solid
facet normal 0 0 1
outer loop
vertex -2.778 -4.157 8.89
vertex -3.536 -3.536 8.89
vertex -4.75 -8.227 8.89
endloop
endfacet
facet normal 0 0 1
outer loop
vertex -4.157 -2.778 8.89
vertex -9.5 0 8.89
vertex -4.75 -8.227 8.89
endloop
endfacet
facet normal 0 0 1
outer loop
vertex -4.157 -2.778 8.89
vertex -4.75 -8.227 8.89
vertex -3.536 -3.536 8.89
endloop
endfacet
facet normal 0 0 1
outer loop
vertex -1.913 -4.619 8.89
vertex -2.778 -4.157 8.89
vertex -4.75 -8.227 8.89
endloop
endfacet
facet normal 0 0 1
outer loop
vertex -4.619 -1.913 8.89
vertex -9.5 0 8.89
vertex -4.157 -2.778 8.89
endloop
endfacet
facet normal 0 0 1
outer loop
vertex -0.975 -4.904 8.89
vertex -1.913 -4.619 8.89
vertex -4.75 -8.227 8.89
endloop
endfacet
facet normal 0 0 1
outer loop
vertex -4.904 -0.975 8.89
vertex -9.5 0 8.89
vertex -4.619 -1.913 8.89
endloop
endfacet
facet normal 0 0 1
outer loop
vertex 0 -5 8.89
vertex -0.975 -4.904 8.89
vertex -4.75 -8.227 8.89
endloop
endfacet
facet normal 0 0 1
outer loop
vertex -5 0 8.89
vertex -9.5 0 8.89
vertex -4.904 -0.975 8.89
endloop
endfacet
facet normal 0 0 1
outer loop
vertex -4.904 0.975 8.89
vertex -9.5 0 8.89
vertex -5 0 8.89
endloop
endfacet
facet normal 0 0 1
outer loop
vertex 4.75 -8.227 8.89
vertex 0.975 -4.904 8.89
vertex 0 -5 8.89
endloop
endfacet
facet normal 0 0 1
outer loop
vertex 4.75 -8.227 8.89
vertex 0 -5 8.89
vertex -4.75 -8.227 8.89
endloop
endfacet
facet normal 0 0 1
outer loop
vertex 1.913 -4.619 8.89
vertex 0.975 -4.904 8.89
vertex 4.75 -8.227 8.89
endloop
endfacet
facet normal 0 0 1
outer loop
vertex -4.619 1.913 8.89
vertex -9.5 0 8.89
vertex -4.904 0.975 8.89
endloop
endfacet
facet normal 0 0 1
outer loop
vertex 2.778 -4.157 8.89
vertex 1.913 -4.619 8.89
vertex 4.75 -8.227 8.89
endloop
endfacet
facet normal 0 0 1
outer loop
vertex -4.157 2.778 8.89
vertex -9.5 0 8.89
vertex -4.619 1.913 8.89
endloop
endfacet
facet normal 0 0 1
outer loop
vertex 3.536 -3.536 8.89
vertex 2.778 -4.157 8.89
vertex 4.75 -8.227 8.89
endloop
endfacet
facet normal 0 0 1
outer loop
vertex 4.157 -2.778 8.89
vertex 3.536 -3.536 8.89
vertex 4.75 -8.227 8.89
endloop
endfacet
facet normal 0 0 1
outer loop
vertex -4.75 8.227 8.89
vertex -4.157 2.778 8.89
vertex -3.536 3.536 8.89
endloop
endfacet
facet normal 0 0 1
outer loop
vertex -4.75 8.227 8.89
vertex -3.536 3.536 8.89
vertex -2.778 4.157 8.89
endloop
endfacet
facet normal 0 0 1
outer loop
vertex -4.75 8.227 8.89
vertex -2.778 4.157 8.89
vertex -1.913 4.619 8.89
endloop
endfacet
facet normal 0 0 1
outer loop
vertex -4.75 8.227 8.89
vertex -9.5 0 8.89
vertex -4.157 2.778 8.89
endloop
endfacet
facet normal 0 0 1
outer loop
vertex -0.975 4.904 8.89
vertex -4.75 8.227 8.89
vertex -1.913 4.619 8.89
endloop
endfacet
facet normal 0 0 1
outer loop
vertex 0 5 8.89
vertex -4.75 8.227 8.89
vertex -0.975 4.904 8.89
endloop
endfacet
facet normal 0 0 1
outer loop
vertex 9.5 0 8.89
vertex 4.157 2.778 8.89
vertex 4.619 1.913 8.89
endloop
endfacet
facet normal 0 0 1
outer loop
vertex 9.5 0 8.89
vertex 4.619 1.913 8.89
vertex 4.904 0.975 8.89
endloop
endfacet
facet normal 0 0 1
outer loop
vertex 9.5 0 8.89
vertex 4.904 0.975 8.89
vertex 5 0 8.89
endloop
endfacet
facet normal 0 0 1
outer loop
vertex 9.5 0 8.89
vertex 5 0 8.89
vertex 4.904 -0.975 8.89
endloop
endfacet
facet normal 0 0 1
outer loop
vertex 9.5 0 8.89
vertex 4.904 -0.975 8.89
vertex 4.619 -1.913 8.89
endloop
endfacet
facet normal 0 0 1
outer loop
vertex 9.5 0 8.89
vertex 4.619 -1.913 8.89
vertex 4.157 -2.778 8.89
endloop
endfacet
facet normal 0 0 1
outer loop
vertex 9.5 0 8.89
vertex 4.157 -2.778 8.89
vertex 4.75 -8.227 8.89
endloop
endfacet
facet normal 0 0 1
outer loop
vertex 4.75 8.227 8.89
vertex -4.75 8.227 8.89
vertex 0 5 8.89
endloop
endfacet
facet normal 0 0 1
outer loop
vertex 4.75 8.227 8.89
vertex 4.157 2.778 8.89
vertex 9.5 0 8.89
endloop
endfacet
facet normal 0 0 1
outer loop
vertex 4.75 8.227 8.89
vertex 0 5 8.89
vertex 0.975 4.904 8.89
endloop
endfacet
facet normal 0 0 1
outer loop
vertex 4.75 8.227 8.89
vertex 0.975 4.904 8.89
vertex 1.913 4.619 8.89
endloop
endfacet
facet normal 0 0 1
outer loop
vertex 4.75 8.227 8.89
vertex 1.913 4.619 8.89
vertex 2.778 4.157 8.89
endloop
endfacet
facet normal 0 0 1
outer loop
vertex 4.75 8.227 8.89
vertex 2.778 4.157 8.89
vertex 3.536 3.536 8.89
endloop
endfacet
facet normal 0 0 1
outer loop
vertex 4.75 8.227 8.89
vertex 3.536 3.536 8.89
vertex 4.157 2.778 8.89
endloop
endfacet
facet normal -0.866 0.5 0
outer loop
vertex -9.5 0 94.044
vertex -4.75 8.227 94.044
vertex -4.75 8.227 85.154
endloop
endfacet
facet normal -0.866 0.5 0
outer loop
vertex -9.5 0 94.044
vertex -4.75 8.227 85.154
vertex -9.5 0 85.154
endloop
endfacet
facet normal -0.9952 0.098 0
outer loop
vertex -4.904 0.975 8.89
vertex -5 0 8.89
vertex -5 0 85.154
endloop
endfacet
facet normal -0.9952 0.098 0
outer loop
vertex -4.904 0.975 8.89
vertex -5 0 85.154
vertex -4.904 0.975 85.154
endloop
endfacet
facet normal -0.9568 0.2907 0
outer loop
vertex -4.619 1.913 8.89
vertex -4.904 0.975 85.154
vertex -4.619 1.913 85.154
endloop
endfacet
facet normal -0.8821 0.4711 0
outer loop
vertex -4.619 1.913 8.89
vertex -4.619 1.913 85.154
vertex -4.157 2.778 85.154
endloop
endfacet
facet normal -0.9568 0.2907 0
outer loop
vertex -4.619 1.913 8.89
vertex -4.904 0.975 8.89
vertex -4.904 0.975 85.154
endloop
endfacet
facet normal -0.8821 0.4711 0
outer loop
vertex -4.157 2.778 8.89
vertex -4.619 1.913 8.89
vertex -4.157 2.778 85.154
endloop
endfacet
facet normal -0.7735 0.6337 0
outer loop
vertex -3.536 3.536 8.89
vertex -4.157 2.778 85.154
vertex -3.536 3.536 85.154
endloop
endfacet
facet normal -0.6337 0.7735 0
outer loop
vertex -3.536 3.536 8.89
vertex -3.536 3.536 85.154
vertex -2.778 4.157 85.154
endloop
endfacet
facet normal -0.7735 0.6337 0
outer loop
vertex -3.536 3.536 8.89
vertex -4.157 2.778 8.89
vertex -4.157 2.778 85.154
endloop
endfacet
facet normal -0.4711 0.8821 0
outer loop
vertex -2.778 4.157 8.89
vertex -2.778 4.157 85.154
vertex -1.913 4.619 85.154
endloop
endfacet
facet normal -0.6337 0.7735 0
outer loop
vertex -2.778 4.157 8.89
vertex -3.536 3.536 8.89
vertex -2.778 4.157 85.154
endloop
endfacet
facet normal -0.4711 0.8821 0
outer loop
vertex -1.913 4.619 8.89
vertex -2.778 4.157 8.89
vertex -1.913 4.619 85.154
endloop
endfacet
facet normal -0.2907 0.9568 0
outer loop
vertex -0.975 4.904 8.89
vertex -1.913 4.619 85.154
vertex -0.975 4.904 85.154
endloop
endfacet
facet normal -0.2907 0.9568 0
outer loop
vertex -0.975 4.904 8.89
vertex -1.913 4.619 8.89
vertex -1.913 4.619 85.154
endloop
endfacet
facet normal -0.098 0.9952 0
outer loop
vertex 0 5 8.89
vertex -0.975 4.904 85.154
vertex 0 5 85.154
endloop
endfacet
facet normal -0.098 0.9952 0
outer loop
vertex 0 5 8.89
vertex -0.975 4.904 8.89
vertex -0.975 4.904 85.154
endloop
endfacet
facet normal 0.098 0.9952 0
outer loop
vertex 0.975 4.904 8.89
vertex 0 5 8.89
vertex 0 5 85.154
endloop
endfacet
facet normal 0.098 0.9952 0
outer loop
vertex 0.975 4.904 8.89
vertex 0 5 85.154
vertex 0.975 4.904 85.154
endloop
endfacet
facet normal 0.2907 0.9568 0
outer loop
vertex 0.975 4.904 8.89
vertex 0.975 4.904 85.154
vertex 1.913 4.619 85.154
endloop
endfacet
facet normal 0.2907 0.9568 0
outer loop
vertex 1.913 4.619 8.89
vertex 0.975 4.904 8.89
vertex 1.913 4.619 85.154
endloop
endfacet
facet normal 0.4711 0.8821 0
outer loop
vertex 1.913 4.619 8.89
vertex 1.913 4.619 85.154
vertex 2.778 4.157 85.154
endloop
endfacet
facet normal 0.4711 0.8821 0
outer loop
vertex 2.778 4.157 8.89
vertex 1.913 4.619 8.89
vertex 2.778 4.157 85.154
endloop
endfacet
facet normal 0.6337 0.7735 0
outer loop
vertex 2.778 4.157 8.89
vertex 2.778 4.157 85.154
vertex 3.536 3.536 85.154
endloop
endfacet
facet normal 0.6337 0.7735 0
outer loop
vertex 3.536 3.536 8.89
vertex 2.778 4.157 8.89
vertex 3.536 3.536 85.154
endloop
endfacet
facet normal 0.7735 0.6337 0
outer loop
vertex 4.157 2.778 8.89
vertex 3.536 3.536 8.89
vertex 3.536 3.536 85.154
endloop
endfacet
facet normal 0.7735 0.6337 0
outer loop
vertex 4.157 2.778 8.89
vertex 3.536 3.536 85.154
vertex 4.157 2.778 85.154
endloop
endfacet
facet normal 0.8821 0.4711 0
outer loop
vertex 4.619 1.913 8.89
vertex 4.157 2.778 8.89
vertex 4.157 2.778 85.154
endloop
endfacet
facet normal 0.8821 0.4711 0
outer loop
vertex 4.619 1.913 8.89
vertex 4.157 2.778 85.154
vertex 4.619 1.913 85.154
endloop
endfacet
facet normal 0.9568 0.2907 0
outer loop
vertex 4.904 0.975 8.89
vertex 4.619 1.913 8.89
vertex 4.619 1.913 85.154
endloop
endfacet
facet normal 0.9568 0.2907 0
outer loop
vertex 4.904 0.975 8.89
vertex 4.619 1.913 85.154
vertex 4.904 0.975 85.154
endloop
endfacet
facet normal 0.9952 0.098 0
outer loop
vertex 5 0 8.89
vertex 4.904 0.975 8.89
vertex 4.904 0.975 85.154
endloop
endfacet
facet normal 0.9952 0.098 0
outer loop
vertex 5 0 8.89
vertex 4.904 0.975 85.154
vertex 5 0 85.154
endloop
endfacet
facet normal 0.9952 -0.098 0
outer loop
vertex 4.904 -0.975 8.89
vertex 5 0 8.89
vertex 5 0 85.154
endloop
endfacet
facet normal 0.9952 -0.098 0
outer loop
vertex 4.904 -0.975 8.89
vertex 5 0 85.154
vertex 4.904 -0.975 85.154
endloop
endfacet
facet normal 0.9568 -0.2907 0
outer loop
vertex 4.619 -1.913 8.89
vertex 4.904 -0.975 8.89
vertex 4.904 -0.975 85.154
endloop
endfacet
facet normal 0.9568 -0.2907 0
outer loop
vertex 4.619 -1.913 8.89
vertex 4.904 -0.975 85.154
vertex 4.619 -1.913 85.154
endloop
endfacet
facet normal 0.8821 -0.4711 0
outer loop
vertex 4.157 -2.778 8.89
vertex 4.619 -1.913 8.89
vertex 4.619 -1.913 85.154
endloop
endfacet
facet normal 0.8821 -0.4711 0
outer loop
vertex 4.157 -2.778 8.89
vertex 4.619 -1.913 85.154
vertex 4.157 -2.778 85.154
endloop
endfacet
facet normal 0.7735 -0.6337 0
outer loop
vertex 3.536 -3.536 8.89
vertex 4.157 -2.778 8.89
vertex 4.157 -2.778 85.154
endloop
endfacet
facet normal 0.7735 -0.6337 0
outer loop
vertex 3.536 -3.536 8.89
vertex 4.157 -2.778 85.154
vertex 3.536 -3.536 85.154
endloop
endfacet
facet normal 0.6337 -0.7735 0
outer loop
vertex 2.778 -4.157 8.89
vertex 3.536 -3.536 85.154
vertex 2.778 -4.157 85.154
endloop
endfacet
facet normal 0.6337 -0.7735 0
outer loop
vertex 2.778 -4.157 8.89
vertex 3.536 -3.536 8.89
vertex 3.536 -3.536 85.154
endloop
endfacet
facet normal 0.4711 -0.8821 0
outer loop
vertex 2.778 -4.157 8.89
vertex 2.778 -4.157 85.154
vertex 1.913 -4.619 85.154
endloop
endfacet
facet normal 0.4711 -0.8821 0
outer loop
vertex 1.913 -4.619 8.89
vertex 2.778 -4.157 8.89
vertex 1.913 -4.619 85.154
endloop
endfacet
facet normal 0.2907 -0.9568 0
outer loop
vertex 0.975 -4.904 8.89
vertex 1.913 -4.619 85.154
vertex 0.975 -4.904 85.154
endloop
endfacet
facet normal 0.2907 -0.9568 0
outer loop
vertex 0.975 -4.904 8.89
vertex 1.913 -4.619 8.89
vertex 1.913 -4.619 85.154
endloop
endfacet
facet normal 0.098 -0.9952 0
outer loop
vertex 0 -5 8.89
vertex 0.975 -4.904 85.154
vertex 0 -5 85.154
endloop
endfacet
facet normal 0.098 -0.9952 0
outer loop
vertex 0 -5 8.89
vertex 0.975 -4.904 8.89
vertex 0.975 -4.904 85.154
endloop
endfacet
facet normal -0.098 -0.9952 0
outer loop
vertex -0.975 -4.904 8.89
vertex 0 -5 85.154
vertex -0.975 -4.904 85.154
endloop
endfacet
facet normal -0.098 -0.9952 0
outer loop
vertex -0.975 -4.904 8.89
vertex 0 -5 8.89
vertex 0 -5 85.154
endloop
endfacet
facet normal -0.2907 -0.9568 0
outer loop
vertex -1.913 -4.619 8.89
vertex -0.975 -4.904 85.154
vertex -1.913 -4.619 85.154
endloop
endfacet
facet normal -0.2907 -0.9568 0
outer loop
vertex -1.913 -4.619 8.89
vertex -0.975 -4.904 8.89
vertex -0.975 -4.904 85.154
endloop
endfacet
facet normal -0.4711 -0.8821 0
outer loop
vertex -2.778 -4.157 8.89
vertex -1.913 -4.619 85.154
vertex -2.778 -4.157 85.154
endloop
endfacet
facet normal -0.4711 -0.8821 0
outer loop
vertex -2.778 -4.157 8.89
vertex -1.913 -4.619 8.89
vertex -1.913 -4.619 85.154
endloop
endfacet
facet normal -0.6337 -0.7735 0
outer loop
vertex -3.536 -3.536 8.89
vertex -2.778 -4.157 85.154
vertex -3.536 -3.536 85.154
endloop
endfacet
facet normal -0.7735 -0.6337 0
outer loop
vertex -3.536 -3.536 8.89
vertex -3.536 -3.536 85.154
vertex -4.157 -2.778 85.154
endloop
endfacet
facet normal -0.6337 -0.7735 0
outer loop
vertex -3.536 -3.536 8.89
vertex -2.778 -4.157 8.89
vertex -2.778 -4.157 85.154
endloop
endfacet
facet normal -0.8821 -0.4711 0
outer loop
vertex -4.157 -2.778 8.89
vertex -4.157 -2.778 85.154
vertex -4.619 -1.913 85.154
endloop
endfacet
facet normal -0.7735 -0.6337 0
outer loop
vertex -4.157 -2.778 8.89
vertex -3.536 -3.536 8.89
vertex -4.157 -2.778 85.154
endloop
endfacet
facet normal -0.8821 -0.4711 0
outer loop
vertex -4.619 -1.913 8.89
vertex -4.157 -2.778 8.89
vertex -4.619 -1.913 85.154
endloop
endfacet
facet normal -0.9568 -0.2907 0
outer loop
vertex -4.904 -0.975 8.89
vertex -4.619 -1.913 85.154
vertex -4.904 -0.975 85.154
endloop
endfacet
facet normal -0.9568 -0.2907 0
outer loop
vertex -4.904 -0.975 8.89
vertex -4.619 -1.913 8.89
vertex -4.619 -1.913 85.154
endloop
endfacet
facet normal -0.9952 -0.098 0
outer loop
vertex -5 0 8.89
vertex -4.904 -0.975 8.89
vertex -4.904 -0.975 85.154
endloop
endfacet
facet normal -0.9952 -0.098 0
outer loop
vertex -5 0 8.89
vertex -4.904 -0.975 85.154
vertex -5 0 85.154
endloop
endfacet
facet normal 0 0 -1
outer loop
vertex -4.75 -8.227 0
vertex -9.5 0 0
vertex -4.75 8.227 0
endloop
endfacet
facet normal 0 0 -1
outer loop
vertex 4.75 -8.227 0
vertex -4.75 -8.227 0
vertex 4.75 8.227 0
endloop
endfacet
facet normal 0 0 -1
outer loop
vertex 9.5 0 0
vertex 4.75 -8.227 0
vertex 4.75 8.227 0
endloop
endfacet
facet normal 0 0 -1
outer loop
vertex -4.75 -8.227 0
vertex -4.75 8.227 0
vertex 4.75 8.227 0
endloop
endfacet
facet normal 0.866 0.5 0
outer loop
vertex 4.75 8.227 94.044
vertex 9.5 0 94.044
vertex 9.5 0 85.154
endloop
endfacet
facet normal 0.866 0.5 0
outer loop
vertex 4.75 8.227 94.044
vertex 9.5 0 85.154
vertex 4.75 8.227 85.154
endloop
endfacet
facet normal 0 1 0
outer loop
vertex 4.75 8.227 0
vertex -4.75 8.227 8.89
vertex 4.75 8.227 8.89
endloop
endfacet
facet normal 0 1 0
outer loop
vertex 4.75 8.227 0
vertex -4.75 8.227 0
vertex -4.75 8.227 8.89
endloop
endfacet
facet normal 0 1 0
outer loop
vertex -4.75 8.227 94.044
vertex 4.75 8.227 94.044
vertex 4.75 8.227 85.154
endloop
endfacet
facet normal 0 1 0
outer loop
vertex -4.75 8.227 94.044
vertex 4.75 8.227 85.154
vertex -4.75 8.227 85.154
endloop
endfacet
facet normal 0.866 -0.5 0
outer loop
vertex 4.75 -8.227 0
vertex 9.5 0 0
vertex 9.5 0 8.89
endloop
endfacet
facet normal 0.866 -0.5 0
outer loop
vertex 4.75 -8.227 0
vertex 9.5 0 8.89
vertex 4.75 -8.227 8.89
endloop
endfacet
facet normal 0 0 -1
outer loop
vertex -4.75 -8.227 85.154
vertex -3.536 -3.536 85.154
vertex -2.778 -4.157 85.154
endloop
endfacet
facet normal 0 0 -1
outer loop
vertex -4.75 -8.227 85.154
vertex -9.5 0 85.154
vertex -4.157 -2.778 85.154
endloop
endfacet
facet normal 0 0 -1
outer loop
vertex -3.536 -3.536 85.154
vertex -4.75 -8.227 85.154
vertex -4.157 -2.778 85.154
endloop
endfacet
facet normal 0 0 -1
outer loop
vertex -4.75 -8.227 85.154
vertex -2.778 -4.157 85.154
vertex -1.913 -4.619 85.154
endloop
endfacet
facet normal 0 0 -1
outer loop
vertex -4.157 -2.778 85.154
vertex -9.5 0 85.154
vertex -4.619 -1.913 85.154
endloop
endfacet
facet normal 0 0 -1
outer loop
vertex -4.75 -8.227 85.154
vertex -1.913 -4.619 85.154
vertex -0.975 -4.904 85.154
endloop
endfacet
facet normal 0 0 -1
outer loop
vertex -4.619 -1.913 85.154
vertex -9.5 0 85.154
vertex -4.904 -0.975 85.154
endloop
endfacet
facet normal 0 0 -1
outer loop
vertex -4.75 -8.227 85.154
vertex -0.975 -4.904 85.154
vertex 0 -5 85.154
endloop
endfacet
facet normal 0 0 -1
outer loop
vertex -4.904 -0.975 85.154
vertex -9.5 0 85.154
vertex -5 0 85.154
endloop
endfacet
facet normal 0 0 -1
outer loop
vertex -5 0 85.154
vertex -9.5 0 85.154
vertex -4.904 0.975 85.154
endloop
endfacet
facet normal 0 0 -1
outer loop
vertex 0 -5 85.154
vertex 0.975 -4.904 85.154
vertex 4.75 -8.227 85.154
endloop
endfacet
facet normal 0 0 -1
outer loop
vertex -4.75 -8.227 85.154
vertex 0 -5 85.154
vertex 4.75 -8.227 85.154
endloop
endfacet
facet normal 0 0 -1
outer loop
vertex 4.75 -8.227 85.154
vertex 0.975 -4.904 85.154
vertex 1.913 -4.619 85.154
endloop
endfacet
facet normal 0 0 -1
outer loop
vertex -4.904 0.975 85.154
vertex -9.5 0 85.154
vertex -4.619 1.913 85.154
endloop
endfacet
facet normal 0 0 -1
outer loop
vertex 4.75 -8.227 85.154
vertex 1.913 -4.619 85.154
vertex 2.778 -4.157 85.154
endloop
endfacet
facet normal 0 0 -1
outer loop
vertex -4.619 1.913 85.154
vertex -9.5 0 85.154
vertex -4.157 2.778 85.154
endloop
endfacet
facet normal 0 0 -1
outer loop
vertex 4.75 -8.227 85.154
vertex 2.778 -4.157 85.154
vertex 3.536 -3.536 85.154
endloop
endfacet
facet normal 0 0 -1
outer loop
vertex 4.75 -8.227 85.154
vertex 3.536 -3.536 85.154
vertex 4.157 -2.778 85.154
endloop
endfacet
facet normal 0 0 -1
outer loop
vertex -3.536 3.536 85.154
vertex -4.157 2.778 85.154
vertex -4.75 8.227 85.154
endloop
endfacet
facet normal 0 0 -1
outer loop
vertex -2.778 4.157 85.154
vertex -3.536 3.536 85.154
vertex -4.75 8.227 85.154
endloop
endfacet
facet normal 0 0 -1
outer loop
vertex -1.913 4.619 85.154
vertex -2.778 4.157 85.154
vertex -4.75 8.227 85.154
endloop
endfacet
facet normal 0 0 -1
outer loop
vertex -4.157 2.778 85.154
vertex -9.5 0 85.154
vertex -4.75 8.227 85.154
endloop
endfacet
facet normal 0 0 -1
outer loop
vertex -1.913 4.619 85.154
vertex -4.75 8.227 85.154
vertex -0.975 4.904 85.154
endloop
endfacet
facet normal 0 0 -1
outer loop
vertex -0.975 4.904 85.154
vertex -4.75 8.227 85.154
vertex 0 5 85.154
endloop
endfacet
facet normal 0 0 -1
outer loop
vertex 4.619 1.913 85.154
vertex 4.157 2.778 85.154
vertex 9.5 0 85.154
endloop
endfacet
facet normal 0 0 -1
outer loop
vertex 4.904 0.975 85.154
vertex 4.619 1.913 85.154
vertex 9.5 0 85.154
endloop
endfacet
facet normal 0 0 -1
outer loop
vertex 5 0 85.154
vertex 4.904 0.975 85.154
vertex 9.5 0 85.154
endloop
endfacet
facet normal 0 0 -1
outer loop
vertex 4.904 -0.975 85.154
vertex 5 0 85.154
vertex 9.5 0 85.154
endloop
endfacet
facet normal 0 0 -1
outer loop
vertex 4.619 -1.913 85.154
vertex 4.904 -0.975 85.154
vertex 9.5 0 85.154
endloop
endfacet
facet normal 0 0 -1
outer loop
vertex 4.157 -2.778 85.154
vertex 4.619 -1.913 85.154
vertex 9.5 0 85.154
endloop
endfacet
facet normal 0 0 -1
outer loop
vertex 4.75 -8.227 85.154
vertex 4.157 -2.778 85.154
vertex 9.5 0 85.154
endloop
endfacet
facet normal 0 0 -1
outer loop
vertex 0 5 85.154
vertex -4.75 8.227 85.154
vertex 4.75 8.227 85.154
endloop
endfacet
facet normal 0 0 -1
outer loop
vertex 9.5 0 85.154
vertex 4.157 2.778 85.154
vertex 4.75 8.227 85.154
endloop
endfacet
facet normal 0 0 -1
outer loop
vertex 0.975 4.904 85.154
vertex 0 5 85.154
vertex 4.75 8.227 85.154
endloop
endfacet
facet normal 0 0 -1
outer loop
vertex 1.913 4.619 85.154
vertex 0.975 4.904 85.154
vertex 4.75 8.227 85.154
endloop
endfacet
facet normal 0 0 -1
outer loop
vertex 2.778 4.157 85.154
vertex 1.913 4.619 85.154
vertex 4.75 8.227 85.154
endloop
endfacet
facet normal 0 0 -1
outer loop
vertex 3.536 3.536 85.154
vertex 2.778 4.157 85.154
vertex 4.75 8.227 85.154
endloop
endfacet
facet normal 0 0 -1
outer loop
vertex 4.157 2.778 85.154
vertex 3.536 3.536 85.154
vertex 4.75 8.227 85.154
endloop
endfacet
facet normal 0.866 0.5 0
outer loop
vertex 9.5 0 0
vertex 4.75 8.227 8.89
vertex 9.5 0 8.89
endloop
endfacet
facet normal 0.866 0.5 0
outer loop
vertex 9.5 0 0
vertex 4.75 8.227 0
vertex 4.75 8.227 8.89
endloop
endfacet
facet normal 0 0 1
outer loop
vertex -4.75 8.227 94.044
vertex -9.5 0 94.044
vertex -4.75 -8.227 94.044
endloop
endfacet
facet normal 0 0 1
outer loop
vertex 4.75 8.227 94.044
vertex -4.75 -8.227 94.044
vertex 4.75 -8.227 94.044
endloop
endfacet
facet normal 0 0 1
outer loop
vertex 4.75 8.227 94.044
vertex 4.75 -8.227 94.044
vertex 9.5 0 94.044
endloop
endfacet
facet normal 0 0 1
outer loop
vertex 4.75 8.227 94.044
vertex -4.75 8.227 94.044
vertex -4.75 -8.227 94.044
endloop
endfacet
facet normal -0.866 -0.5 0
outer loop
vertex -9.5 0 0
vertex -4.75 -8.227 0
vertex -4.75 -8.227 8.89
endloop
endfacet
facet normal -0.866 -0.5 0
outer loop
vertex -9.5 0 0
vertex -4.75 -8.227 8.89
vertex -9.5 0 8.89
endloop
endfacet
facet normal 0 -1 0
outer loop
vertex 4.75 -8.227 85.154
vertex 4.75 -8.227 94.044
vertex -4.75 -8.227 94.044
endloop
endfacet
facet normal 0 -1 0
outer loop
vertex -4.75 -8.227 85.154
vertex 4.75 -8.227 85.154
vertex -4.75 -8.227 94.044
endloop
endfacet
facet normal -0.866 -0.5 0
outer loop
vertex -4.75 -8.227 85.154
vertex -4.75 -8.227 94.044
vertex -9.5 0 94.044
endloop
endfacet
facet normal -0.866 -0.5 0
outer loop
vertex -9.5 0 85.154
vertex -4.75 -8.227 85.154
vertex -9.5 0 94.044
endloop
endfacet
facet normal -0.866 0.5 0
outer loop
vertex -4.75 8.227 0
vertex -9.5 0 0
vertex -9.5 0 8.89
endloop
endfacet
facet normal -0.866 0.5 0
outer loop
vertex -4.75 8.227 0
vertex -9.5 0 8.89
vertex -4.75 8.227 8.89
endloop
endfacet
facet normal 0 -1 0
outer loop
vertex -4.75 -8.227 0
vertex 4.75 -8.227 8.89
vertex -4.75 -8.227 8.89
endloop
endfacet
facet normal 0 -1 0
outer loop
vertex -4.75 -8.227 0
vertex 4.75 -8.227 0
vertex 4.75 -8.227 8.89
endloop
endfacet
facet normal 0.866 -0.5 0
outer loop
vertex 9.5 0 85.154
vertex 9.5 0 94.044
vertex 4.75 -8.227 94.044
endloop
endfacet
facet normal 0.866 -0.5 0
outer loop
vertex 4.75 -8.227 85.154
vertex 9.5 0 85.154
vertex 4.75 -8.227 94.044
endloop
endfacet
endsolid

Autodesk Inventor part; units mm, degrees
ref_plane "YZ Plane" through (0, 0, 0) normal (1, 0, 0) x (0, 1, 0)
ref_plane "XZ Plane" through (0, 0, 0) normal (0, 1, 0) x (-1, 0, 0)
ref_plane "XY Plane" through (0, 0, 0) normal (0, 0, 1) x (1, 0, 0)
sketch "Sketch1" plane through (0, 0, 0) normal (0, 0, 1) x (1, 0, 0)
  circle A0 centre (0, 0) radius 5
  circle A1 centre (0, 0) radius 9.5
  line L0 (-4.75, 8.2272) -> (4.75, 8.2272)
  line L1 (4.75, 8.2272) -> (9.5, 0)
  line L2 (9.5, 0) -> (4.75, -8.2272)
  line L3 (4.75, -8.2272) -> (-4.75, -8.2272)
  line L4 (-4.75, -8.2272) -> (-9.5, 0)
  line L5 (-9.5, 0) -> (-4.75, 8.2272)
  dimension "d0" = 10
  dimension "d1" = 19
extrude "Extrusion1" add sketch "Sketch1" along normal blind 8.89 contours L2 L3 L4 L5 L0 L1
sketch "Sketch2" plane through (0, 0, 0) normal (0, 0, -1) x (-1, 0, 0)
  circle A0 centre (0, 0) radius 5
  dimension "d4" = 10
extrude "Extrusion2" add sketch "Sketch2" against normal blind 94.0435
sketch "Sketch3" plane through (0, 0, 94.0435) normal (0, 0, 1) x (1, 0, 0)
  line L0 (-4.75, 8.2272) -> (-9.5, 0) projected
  circle A0 centre (0, 0) radius 9.5
  line L1 (-9.5, 0) -> (-4.75, 8.2272)
  line L2 (4.75, 8.2272) -> (-4.75, 8.2272) projected
  line L3 (-4.75, 8.2272) -> (4.75, 8.2272)
  line L4 (9.5, 0) -> (4.75, 8.2272) projected
  line L5 (4.75, 8.2272) -> (9.5, 0)
  line L6 (9.5, 0) -> (4.75, -8.2272)
  line L7 (4.75, -8.2272) -> (-4.75, -8.2272)
  line L8 (-4.75, -8.2272) -> (-9.5, 0)
extrude "Extrusion3" add sketch "Sketch3" against normal blind 8.89 contours L2 L4 L6 L7 L8 L0
properties part number "hing rod"
